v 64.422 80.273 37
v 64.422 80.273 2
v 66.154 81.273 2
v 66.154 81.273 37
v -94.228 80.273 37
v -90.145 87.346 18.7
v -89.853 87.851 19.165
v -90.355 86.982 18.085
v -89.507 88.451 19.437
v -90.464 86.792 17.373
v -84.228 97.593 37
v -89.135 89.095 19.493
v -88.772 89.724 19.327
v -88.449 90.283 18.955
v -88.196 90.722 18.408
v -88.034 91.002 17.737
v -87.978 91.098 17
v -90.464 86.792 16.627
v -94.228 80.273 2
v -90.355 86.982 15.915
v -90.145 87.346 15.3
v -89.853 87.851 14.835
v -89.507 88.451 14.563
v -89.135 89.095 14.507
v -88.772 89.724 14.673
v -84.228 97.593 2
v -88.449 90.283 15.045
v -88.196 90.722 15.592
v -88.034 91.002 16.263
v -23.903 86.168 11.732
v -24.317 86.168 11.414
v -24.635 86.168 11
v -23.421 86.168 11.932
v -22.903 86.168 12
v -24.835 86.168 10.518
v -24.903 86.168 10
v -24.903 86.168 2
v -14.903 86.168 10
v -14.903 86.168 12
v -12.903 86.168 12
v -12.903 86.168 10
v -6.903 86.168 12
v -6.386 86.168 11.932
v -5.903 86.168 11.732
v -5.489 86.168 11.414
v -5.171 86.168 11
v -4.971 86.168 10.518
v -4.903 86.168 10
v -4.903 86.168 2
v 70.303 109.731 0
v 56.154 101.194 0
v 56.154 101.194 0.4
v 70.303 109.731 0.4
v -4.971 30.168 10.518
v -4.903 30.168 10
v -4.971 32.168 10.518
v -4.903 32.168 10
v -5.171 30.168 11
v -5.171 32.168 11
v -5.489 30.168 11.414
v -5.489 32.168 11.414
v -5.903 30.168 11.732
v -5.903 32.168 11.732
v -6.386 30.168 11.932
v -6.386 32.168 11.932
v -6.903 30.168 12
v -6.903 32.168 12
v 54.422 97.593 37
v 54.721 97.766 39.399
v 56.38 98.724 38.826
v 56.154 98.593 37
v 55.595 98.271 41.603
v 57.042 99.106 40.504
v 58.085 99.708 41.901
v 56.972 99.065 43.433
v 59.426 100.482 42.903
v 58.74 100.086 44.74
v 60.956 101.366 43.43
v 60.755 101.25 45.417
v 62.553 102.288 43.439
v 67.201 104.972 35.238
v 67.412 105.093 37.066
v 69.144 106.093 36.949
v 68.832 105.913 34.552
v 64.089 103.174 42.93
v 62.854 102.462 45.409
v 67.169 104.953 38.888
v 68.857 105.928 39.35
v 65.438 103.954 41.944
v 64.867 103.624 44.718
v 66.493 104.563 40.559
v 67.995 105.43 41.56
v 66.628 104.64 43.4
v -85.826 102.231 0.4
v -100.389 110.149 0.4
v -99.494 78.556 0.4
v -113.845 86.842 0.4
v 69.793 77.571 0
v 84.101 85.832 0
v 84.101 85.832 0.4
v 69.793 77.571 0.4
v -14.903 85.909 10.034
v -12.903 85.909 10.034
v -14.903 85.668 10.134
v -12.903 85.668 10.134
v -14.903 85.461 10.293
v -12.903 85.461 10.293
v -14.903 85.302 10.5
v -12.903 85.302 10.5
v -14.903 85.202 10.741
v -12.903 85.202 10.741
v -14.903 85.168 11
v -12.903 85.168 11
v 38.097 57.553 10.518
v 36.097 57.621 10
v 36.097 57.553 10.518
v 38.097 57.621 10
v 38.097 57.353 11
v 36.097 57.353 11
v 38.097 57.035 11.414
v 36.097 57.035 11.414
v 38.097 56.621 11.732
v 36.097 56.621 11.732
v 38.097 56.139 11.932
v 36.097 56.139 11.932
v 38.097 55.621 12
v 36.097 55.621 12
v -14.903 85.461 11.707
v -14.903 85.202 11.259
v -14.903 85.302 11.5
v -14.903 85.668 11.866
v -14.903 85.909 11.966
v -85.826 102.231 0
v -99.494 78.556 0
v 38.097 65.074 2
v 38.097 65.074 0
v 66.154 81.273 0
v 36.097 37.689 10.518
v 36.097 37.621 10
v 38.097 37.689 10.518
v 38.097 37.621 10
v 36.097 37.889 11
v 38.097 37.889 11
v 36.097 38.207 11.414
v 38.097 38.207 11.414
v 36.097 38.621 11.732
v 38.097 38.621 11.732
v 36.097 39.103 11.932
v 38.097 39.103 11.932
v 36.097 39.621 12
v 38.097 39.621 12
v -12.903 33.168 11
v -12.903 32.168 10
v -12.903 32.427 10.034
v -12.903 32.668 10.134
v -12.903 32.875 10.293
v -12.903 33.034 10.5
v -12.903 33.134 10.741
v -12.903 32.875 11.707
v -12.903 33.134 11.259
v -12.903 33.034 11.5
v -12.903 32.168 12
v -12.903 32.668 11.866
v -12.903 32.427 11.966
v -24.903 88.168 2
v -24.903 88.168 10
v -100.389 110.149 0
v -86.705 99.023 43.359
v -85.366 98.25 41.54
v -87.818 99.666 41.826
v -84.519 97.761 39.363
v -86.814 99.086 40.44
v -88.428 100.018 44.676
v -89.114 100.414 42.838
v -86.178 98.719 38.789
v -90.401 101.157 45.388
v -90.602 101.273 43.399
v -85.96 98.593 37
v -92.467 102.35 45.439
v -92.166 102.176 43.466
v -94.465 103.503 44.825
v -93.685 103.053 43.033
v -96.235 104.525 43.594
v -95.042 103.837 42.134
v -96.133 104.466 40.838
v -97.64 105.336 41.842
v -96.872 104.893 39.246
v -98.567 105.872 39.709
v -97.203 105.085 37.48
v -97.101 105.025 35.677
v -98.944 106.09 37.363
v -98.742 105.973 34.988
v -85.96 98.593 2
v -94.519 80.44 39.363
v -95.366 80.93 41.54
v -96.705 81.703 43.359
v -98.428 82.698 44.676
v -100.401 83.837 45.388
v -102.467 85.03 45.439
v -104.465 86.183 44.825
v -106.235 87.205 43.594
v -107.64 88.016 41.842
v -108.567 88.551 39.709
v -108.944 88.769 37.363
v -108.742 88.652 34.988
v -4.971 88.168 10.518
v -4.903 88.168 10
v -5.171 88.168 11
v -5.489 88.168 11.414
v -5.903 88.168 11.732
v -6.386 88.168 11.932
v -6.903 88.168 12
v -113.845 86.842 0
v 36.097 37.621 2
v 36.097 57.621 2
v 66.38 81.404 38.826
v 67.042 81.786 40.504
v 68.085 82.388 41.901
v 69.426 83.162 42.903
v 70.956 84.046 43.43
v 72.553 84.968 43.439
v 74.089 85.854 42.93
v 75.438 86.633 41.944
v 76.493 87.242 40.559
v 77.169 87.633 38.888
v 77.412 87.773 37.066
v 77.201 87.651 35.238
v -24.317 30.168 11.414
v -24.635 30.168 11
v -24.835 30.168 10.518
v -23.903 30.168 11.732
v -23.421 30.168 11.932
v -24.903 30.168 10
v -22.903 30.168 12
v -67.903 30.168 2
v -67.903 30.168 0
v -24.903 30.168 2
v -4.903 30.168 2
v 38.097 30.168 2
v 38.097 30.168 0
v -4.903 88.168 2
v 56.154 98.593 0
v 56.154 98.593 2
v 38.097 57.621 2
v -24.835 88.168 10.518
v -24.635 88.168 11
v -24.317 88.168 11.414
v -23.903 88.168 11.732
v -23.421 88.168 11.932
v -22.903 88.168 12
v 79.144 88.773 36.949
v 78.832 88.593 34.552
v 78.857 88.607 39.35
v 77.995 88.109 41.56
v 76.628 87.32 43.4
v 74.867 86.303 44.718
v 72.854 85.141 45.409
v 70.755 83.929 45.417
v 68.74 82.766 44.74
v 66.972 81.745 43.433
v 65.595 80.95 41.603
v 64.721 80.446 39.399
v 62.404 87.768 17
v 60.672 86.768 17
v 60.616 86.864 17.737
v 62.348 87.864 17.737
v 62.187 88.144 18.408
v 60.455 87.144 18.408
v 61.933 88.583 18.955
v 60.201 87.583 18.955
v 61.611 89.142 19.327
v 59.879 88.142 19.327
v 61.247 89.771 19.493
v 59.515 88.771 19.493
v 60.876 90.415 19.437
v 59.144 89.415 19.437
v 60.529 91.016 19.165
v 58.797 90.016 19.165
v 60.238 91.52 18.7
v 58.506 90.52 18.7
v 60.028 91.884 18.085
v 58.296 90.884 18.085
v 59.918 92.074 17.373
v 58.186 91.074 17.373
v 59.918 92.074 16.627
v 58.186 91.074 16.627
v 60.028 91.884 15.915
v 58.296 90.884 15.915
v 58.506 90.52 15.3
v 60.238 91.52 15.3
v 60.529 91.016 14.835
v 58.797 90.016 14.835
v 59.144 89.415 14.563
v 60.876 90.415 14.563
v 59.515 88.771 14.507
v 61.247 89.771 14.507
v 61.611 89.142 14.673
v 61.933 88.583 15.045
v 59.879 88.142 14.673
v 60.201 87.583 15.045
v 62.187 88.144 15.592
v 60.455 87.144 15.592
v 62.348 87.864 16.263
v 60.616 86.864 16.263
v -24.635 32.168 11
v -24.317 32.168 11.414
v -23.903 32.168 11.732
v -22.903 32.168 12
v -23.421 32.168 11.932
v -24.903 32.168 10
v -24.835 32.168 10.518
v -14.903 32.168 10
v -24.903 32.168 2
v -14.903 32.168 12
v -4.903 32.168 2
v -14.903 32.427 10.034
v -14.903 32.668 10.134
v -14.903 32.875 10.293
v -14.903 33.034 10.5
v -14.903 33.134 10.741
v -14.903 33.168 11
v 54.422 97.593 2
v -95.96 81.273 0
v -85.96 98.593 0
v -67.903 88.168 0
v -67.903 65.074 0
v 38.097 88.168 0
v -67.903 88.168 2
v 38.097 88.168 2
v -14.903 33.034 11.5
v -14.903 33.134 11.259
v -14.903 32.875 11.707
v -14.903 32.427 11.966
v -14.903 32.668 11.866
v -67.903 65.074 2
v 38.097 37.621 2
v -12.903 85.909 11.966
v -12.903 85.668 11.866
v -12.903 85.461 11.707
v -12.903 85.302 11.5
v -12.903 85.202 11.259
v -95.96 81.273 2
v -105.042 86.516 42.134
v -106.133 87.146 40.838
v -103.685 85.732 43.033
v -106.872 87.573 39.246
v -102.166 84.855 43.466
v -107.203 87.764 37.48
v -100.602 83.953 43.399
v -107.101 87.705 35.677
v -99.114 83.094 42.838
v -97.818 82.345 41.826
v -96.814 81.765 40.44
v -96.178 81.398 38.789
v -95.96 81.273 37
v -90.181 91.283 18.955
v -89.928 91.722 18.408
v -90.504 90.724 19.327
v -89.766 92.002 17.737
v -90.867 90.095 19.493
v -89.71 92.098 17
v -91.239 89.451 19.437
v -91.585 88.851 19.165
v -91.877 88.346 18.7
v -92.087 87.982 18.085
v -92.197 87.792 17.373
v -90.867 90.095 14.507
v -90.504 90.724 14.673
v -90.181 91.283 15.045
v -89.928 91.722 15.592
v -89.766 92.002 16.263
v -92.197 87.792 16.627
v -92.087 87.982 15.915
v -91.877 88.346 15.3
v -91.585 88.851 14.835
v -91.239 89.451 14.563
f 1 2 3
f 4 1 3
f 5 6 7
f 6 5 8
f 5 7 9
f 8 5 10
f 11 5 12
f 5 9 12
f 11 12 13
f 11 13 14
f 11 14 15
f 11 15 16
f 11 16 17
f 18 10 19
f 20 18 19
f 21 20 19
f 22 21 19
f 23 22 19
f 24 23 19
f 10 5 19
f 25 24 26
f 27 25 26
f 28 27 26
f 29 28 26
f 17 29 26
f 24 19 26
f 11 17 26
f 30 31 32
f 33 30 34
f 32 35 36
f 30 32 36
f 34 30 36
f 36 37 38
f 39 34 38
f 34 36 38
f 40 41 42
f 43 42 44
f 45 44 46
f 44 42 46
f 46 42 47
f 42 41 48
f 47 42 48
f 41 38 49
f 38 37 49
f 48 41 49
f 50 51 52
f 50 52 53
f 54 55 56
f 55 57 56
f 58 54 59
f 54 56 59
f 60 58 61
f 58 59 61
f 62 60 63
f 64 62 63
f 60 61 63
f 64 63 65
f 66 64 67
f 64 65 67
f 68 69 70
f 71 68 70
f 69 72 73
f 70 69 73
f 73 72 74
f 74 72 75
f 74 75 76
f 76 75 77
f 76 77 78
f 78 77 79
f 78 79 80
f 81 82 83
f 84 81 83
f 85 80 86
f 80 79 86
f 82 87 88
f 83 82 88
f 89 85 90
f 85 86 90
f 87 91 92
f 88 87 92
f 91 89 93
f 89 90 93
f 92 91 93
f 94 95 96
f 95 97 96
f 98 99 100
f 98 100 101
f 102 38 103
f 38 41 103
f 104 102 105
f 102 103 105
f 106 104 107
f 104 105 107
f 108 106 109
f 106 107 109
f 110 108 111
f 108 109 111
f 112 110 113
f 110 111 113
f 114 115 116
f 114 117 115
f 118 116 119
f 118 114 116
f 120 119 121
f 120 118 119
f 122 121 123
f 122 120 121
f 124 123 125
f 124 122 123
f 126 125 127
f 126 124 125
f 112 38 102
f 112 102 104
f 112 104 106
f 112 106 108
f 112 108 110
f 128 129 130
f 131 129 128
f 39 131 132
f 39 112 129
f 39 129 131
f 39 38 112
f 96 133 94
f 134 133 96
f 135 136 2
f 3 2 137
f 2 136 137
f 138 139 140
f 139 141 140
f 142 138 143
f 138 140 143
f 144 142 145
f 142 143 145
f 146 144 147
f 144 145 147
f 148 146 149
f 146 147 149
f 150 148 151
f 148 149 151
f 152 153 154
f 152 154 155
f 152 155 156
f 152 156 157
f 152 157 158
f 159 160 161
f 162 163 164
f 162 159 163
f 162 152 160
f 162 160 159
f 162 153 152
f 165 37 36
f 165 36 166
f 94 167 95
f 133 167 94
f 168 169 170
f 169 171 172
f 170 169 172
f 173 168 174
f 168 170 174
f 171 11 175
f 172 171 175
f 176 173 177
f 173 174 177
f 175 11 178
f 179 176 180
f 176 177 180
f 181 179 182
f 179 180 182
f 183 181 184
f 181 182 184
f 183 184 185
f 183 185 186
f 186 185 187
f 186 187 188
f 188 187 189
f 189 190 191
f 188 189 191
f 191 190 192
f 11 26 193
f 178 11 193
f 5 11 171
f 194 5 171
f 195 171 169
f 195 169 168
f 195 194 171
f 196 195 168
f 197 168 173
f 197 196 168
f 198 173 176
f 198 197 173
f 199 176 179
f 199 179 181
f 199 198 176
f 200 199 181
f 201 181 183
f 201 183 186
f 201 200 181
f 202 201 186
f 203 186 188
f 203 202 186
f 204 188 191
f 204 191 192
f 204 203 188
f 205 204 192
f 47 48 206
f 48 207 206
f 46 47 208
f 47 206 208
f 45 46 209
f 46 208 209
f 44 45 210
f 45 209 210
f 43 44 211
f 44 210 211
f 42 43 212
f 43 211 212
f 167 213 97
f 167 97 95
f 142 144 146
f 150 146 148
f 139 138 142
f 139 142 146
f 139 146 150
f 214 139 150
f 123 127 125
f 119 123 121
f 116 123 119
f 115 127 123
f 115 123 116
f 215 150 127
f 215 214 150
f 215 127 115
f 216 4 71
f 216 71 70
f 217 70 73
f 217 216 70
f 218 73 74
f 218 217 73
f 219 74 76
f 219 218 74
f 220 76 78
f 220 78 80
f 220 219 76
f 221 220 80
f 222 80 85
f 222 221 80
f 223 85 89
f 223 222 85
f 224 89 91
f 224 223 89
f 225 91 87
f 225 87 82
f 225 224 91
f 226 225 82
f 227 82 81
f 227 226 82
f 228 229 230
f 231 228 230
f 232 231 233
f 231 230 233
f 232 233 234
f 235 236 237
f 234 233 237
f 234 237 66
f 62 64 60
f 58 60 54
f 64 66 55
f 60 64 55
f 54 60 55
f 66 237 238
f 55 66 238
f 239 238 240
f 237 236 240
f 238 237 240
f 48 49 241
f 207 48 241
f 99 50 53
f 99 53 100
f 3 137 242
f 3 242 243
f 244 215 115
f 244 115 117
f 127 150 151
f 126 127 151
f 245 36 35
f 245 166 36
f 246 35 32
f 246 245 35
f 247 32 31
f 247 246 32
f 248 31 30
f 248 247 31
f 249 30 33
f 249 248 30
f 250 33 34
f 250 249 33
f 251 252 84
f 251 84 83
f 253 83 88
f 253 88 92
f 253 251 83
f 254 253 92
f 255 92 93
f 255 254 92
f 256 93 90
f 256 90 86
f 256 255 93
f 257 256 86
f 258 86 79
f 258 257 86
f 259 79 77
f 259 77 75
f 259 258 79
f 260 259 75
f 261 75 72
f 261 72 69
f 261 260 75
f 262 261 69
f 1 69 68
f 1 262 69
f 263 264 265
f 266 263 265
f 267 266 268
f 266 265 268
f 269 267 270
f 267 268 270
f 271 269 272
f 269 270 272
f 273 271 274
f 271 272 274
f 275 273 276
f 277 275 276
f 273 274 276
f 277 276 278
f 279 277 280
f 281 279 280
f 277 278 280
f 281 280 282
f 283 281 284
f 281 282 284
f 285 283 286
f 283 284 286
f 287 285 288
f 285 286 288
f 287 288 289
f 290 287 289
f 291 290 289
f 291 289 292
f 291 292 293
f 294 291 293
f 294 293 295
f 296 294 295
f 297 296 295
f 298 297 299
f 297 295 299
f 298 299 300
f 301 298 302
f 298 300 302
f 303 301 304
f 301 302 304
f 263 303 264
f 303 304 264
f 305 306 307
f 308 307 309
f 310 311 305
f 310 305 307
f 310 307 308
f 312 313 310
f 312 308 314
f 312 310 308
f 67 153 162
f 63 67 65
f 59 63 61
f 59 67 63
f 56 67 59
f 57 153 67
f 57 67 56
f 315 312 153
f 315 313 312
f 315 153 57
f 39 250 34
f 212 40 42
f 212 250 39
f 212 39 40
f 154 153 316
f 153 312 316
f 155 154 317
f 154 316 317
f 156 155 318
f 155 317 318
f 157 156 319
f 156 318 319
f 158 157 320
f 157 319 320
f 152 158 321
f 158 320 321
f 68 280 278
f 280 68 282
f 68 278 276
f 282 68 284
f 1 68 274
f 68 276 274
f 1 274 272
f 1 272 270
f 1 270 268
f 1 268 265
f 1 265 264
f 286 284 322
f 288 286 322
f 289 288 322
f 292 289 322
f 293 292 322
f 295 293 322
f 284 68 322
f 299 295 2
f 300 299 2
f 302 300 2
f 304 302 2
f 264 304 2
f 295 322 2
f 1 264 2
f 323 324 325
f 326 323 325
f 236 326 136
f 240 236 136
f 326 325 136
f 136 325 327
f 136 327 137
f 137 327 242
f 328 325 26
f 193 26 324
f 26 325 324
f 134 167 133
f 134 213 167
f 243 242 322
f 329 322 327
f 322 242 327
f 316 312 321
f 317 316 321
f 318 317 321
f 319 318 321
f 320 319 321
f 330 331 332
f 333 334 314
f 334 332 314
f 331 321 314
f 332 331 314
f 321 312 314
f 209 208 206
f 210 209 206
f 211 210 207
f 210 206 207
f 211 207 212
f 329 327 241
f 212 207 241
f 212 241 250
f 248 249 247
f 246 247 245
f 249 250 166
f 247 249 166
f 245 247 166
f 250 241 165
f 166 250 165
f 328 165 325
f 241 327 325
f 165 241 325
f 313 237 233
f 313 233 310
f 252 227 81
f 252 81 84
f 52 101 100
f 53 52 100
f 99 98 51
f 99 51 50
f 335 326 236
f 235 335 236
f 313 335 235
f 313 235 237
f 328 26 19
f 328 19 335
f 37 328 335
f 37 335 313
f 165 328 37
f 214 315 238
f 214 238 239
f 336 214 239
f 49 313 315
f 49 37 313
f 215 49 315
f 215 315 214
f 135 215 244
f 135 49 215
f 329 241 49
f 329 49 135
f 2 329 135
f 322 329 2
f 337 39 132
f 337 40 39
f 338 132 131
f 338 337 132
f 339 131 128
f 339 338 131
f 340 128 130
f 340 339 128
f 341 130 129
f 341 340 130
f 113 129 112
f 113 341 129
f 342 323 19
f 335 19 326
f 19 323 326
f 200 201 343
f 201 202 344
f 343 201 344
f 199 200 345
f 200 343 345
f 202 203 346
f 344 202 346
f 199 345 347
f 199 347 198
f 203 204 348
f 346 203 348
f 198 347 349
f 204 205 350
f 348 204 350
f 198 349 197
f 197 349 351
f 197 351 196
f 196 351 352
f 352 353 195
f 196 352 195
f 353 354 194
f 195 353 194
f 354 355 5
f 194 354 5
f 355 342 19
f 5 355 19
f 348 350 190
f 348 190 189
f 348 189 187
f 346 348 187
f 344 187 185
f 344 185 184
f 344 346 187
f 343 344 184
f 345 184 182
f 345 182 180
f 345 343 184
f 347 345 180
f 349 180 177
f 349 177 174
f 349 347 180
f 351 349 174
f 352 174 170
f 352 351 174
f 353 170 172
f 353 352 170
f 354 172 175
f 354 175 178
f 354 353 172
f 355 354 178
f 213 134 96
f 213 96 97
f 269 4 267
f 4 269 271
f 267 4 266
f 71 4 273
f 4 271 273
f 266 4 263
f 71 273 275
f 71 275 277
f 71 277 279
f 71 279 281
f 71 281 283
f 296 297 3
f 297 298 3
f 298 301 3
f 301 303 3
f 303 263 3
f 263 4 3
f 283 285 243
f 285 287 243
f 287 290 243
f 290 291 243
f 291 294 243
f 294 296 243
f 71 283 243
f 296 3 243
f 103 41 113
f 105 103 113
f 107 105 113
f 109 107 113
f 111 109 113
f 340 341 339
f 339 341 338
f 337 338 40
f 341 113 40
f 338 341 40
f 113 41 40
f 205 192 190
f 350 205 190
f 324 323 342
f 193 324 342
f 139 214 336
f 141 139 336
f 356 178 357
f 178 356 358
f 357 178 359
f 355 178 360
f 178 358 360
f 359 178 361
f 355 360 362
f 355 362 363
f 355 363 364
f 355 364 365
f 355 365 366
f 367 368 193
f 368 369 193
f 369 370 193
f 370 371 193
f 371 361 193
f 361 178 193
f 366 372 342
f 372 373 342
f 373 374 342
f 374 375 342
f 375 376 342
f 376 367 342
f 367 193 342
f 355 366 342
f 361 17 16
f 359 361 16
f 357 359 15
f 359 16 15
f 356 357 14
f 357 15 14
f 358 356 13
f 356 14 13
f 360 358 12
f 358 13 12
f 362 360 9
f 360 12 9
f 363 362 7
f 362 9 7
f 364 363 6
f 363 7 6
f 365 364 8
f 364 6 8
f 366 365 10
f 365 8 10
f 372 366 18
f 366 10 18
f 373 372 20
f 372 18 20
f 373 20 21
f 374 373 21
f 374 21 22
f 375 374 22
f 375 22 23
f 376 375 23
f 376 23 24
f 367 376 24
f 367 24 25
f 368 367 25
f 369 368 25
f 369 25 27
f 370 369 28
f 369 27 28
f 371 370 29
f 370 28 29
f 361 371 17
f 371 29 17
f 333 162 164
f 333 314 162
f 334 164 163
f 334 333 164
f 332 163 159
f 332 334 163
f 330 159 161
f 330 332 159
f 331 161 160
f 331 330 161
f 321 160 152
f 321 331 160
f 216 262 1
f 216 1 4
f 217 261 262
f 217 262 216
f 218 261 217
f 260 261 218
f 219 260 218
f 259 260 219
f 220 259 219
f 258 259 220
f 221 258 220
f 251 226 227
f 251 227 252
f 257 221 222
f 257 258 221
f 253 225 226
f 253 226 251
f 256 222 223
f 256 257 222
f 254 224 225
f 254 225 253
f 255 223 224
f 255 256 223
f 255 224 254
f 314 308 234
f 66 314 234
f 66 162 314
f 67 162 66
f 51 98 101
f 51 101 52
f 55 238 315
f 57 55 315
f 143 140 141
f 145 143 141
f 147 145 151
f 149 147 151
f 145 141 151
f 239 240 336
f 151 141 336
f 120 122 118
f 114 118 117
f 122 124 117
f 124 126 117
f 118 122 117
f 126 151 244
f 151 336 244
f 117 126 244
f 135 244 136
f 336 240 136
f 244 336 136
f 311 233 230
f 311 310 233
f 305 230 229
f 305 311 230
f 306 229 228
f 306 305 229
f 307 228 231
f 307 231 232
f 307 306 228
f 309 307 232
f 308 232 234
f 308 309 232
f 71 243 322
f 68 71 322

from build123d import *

# Parameters (mm, degrees)
F1_DEPTH  = 2
F3_DEPTH  = 35
F5_DEPTH  = 20
F6_W      = 6.5
F6_H      = 2
F7_DEPTH  = 20
F9_DEPTH  = 20
F10_W     = 6.5
F10_H     = 2
F11_DEPTH = 20
F12_R     = 2.5
F13_DEPTH = 2
F14_R     = 2.5
F15_DEPTH = 2
F16_W     = 20
F16_H     = 2
F16_W_2   = 2
F16_H_2   = 20
F17_DEPTH = 10
F18_R     = 2
F19_W     = 2
F19_H     = 2
F20_DEPTH = 1
F21_R     = 0.99999
F22_W     = 2
F22_H     = 2
F23_DEPTH = 1
F24_R     = 0.99999
F26_DEPTH = 0.4


# Not quite as in the source:
# - a fillet or chamfer is up to 0.001 mm smaller than in the source, because OpenCascade refuses the exact size


with BuildPart() as f1:
    # F0 (on Top) → F1 (new body)
    with BuildSketch(Plane.XY):
        Polygon((-67.9032802582, 30.168056488), (38.0967197418, 30.168056488), (38.0967197418, 65.0740457205), (38.0967197418, 88.168056488), (-67.9032802582, 88.168056488), (-67.9032802582, 65.0740457205), align=None)
        Polygon((-101.5896410854, 84.5228752121), (-67.9032802582, 65.0740457205), (-67.9032802582, 88.168056488), (-91.5896410854, 101.8433832877), align=None)
        Polygon((38.0967197418, 88.168056488), (38.0967197418, 65.0740457205), (71.783080569, 84.5228752121), (61.783080569, 101.8433832877), align=None)
    extrude(amount=F1_DEPTH)

    # F2 (on face) → F3 (join)
    with BuildSketch(Plane.XY.offset(2)):
        Polygon((-84.2284251532, 97.5933832877), (-85.9604759608, 98.5933832877), (-95.9604759608, 81.2728752121), (-94.2284251532, 80.2728752121), align=None)
        Polygon((56.1539154444, 98.5933832877), (54.4218646369, 97.5933832877), (64.4218646369, 80.2728752121), (66.1539154444, 81.2728752121), align=None)
    extrude(amount=F3_DEPTH)

    # F4 (on face) → F5 (join)
    with BuildSketch(Plane(origin=(-18.653708425, 32.3091707417, 0), x_dir=(0.8660254038, 0.5, 0), z_dir=(0.5, -0.8660254038, 0))):
        with BuildLine():
            ThreePointArc((97.9274089407, 37), (105.3169745916, 43.4388409635), (110.6839236954, 35.2376086915))
            Line((110.6839236954, 35.2376086915), (112.5673020138, 34.5521150438))
            ThreePointArc((112.5673020138, 34.5521150438), (105.664524311, 45.4094913973), (95.9274089407, 37))
            Line((95.9274089407, 37), (97.9274089407, 37))
        make_face()
    extrude(amount=-F5_DEPTH)

    # F6 (on face) → F7 (cut)
    with BuildSketch(Plane(origin=(-18.653708425, 32.3091707417, 0), x_dir=(0.8660254038, 0.5, 0), z_dir=(0.5, -0.8660254038, 0))):
        with Locations((101.1774089407, 1)):
            Rectangle(F6_W, F6_H)
    extrude(amount=-F7_DEPTH, mode=Mode.SUBTRACT)

    # F8 (on face) → F9 (join)
    with BuildSketch(Plane(origin=(11.2020682959, 19.4025514384, 0), x_dir=(0.8660254038, -0.5, 0), z_dir=(-0.5, -0.8660254038, 0))):
        Polygon((-121.7406475473, 2), (-121.7406475473, 37), (-123.7406475473, 37), (-123.7406475473, 2), (-130.2406475473, 2), (-130.2406475473, 0), (-91.3429885641, 0), (-91.3429885641, 2), align=None)
        with BuildLine():
            Line((-123.7406475473, 37), (-121.7406475473, 37))
            ThreePointArc((-121.7406475473, 37), (-131.2541063524, 45.439366164), (-138.4989772533, 34.9875411887))
            Line((-138.4989772533, 34.9875411887), (-136.6045913116, 35.6770412837))
            ThreePointArc((-136.6045913116, 35.6770412837), (-130.9056157917, 43.4658964757), (-123.7406475473, 37))
        make_face()
    extrude(amount=-F9_DEPTH)

    # F10 (on face) → F11 (cut)
    with BuildSketch(Plane(origin=(11.2020682959, 19.4025514384, 0), x_dir=(0.8660254038, -0.5, 0), z_dir=(-0.5, -0.8660254038, 0))):
        with Locations((-126.9906475473, 1)):
            Rectangle(F10_W, F10_H)
    extrude(amount=-F11_DEPTH, mode=Mode.SUBTRACT)

    # F12 (on face) → F13 (cut)
    with BuildSketch(Plane(origin=(-105.4304934491, 60.8703237737, 0), x_dir=(0.5, 0.8660254038, 0), z_dir=(0.8660254038, -0.5, 0))):
        with Locations((32.4041365919, 17)):
            Circle(F12_R)
    extrude(amount=-F13_DEPTH, mode=Mode.SUBTRACT)

    # F14 (on face) → F15 (cut)
    with BuildSketch(Plane(origin=(83.0755730619, 47.9637044704, 0), x_dir=(0.5, -0.8660254038, 0), z_dir=(-0.8660254038, -0.5, 0))):
        with Locations((-47.30741685, 17)):
            Circle(F14_R)
    extrude(amount=-F15_DEPTH, mode=Mode.SUBTRACT)

    # F16 (on face) → F17 (join)
    with BuildSketch(Plane.XY.offset(2)):
        with Locations((-14.9032802582, 87.168056488)):
            Rectangle(F16_W, F16_H)
        with Locations((-14.9032802582, 31.168056488)):
            Rectangle(F16_W, F16_H)
        with Locations((37.0967197418, 47.6210511042)):
            Rectangle(F16_W_2, F16_H_2)
    extrude(amount=F17_DEPTH)

    # F18
    f18_edges = [f1.edges().sort_by_distance(p)[0] for p in [
        (-24.90328, 87.168056, 12),
        (-4.90328, 87.168056, 12),
        (-24.90328, 31.168056, 12),
        (-4.90328, 31.168056, 12),
        (37.09672, 37.621051, 12),
        (37.09672, 57.621051, 12),
    ]]
    fillet(f18_edges, radius=F18_R)

    # F19 (on face) → F20 (join)
    with BuildSketch(Plane.XZ.offset(-86.168056488)):
        with Locations((-13.9032802582, 11)):
            Rectangle(F19_W, F19_H)
    extrude(amount=F20_DEPTH)

    # F21 (radius 1 in the source; OpenCascade refuses exactly that, so slightly less here)
    f21_edges = [f1.edges().sort_by_distance(p)[0] for p in [
        (-13.90328, 85.168056, 10),
        (-13.90328, 85.168056, 12),
    ]]
    fillet(f21_edges, radius=F21_R)

    # F22 (on face) → F23 (join)
    with BuildSketch(Plane(origin=(0, 32.168056488, 0), x_dir=(-1, 0, 0), z_dir=(0, 1, 0))):
        with Locations((13.9032802582, 11)):
            Rectangle(F22_W, F22_H)
    extrude(amount=F23_DEPTH)

    # F24 (radius 1 in the source; OpenCascade refuses exactly that, so slightly less here)
    f24_edges = [f1.edges().sort_by_distance(p)[0] for p in [
        (-13.90328, 33.168056, 10),
        (-13.90328, 33.168056, 12),
    ]]
    fillet(f24_edges, radius=F24_R)


with BuildPart() as f26:
    # F25 (on face) → F26 (new body)
    with BuildSketch(Plane(origin=(0, 0, 0), x_dir=(1, 0, 0), z_dir=(0, 0, -1))):
        Polygon((69.792699928, -77.5712246278), (56.1539154444, -101.1942923069), (70.3034838034, -109.7310148019), (84.1013854701, -85.8323480773), align=None)
    extrude(amount=-F26_DEPTH)


with BuildPart() as f26b:
    # F25 (on face) → F26, piece 2 (new body)
    with BuildSketch(Plane(origin=(0, 0, 0), x_dir=(1, 0, 0), z_dir=(0, 0, -1))):
        Polygon((-100.3888883417, -110.1487811715), (-85.8259052038, -102.2308915854), (-99.4944213659, -78.5563271285), (-113.8452054823, -86.8417562012), align=None)
    extrude(amount=-F26_DEPTH)


solid = Compound([f1.part, f26.part, f26b.part])
